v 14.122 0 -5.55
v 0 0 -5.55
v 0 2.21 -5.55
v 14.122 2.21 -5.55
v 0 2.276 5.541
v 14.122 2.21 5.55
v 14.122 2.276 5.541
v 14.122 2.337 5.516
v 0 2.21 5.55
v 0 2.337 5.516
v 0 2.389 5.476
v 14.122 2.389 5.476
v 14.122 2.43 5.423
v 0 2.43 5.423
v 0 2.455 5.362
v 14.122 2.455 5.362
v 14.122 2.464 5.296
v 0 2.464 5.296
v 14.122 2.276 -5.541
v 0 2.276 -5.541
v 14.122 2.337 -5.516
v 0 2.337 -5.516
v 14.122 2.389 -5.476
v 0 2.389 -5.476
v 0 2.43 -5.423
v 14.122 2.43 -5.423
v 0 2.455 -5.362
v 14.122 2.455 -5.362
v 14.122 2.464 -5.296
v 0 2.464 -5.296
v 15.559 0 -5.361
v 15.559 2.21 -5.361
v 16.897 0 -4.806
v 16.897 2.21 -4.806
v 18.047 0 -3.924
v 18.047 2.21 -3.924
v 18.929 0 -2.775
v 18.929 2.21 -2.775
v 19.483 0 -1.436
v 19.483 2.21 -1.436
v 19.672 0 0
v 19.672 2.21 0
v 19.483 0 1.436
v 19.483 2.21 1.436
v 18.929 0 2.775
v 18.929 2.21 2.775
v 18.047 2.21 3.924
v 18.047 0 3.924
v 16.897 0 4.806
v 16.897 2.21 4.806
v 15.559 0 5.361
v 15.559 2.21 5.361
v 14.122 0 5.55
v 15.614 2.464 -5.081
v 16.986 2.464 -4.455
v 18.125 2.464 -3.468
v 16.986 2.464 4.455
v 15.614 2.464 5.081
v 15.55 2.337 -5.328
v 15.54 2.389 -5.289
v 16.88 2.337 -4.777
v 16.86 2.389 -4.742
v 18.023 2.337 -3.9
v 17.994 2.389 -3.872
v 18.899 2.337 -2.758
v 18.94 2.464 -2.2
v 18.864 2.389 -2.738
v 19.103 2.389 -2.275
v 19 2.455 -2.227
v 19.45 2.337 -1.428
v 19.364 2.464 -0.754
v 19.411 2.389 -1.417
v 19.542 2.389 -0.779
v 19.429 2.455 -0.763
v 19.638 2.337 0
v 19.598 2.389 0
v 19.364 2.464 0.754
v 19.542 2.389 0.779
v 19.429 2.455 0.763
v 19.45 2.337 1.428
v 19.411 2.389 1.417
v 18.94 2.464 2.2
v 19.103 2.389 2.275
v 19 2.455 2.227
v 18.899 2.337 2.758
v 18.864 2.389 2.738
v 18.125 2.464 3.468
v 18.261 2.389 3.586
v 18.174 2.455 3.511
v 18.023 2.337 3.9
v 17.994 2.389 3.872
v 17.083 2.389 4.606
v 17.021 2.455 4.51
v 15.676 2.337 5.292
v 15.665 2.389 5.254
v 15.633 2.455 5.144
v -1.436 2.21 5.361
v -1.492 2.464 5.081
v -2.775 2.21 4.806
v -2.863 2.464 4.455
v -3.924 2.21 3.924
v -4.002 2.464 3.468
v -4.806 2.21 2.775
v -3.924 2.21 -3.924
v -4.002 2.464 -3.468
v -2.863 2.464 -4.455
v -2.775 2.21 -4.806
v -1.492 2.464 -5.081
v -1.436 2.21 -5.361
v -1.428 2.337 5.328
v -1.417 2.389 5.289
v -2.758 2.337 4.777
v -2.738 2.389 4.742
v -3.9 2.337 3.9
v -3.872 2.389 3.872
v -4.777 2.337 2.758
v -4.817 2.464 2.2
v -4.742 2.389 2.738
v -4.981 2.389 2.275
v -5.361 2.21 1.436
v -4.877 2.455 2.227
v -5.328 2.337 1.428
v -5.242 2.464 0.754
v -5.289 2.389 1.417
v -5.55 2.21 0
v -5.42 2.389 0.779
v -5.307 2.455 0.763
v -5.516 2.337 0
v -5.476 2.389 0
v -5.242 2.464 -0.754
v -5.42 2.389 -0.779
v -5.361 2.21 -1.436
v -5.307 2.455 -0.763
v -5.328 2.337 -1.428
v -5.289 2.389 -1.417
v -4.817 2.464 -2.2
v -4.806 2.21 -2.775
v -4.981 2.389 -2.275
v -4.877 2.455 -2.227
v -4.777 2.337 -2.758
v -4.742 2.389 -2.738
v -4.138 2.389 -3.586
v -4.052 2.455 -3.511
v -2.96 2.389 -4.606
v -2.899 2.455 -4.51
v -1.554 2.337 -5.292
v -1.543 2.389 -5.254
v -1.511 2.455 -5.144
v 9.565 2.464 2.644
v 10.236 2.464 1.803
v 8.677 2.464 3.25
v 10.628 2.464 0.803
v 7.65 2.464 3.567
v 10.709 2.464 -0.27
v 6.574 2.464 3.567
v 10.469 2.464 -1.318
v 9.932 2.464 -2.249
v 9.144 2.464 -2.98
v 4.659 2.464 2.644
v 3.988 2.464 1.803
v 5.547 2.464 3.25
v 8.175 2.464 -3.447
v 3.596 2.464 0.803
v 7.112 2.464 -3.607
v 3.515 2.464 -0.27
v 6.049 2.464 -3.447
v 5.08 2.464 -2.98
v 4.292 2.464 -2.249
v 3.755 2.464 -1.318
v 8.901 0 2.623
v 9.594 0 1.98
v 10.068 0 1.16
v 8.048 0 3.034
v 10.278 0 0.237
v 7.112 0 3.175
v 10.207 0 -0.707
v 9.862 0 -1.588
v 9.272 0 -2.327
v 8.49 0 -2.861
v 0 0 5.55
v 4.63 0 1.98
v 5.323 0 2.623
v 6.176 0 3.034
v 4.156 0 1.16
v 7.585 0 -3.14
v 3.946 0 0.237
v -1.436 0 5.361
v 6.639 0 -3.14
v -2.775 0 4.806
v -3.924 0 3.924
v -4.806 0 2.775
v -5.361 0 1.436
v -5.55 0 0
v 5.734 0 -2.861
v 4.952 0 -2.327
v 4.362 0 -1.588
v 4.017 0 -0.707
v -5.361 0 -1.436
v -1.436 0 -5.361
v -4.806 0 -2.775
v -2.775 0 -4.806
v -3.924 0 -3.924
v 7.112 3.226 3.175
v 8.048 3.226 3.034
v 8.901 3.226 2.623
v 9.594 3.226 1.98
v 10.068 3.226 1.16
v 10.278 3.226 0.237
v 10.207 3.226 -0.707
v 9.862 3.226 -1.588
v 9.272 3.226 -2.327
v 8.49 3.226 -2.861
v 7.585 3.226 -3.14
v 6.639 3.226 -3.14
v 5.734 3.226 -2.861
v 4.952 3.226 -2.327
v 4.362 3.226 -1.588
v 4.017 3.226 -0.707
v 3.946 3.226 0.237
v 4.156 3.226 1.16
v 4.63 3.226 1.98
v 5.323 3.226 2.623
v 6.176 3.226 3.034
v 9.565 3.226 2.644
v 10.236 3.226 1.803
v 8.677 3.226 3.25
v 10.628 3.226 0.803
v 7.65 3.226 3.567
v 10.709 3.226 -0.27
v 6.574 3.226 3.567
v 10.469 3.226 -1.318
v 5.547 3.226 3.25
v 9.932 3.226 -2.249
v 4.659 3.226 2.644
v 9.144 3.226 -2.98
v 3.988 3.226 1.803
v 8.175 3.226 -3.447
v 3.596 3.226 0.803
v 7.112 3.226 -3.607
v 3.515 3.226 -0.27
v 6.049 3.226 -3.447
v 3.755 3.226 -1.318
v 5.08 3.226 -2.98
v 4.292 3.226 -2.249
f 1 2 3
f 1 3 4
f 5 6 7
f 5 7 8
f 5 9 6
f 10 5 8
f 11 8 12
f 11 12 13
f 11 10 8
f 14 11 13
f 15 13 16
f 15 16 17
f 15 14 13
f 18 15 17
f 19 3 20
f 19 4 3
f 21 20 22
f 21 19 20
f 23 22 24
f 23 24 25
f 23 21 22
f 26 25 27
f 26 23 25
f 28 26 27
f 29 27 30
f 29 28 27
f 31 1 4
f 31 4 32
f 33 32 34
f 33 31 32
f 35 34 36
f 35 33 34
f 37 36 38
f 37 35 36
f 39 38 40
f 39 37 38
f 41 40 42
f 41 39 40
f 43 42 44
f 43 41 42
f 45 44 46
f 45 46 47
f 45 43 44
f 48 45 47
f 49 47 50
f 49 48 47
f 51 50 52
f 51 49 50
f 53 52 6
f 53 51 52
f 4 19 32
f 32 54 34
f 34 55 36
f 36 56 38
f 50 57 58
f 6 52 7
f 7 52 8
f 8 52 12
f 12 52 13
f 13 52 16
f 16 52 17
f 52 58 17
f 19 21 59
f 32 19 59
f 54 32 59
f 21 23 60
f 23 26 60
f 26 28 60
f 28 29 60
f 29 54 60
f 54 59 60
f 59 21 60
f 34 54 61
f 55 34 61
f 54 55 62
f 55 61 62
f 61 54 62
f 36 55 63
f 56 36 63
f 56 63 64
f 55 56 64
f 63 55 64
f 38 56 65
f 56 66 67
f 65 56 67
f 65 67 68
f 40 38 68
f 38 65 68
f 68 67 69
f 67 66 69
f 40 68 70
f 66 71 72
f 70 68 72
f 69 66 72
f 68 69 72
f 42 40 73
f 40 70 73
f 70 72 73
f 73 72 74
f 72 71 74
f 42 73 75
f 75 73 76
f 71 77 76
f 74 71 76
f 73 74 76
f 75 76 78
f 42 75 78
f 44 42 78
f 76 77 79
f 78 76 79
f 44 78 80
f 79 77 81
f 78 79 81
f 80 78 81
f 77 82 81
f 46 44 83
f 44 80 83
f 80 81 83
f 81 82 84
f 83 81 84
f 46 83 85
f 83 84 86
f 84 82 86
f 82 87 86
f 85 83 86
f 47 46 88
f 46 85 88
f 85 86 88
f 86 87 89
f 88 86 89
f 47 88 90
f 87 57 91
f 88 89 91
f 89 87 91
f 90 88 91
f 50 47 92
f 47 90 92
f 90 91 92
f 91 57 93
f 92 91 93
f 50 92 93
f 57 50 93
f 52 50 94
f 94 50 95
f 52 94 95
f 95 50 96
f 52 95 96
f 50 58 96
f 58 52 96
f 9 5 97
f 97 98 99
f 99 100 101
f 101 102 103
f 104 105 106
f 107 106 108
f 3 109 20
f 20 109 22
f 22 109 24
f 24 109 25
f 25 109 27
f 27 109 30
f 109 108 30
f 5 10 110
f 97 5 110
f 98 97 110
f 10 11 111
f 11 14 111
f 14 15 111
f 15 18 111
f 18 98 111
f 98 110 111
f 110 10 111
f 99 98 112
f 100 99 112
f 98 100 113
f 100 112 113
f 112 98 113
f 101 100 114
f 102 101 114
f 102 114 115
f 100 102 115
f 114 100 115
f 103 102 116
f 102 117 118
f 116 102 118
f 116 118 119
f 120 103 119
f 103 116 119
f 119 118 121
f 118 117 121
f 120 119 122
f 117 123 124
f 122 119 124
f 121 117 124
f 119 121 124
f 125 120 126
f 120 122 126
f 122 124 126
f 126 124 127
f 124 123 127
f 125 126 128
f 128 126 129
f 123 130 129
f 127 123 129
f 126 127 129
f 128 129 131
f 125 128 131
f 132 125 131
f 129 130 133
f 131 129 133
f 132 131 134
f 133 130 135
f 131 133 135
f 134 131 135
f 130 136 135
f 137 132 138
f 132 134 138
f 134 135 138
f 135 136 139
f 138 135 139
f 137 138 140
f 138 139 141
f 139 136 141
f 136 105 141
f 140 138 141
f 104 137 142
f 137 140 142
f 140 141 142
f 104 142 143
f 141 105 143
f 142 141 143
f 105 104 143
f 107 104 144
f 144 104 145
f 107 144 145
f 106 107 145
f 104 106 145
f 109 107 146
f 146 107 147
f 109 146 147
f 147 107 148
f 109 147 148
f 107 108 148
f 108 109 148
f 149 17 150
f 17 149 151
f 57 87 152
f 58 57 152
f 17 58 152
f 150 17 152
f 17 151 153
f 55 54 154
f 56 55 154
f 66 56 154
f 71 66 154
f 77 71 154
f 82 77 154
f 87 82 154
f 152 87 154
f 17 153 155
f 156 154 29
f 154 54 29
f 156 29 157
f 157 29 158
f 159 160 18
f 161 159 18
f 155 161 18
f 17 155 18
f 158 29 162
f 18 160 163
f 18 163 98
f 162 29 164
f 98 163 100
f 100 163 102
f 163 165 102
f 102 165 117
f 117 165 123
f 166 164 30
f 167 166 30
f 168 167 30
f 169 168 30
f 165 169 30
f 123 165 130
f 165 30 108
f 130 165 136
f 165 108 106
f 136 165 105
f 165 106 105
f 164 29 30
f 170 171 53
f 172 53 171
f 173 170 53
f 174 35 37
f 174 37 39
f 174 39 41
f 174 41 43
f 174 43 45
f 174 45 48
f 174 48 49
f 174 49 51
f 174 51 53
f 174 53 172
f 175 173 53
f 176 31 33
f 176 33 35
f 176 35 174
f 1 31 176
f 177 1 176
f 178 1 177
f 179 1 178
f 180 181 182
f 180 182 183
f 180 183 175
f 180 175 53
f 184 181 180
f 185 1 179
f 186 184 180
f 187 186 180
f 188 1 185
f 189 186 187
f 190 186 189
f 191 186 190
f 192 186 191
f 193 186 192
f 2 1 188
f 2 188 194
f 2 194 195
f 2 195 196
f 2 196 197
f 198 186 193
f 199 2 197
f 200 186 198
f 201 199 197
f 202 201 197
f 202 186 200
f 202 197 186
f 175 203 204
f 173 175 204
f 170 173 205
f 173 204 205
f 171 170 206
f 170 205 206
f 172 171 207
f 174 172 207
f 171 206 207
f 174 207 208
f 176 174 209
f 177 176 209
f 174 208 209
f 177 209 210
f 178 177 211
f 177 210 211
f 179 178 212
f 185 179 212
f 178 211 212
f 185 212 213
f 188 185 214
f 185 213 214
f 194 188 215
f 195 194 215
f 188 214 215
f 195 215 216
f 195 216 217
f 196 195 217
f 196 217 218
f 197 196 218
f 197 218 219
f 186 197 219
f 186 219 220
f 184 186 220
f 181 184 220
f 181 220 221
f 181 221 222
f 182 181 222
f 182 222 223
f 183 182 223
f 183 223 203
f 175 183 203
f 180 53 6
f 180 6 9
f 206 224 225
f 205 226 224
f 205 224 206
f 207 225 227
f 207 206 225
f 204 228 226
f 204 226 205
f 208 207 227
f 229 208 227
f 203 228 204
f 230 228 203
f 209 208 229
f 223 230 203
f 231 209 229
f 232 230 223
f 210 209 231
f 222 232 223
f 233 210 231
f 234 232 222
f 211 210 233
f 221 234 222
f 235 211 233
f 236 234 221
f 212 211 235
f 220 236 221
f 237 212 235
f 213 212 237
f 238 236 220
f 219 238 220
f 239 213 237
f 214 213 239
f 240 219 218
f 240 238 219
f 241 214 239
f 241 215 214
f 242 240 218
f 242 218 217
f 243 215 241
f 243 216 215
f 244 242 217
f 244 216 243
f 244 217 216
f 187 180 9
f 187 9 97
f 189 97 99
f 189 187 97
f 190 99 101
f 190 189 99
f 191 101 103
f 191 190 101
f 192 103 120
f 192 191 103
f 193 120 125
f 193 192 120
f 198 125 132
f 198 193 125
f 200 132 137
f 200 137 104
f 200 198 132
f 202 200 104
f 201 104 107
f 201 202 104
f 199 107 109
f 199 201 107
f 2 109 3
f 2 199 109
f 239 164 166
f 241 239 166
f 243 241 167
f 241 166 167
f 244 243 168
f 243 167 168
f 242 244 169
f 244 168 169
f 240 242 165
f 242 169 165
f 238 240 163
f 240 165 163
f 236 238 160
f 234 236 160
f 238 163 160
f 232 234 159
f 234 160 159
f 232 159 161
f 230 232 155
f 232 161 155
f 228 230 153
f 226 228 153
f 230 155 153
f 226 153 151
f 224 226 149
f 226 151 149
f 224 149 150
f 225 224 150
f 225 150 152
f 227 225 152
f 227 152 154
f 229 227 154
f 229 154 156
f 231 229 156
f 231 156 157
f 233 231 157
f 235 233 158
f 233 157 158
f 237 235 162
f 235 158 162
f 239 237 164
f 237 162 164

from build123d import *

# Parameters (mm, degrees)
BOSS_EXTRUDE1_DEPTH = 2.4638
SKETCH2_R           = 3.6068
BOSS_EXTRUDE3_DEPTH = 0.762
SKETCH5_R           = 3.175
CUT_EXTRUDE2_DEPTH  = 21.693152562
FILLET1_R           = 0.254


with BuildPart() as part:
    # Sketch1 → Boss-Extrude1 (new body)
    with BuildSketch(Plane(origin=(0, 0, 0), x_dir=(1, 0, 0), z_dir=(0, 1, 0))):
        with BuildLine():
            Line((0, 5.5499), (14.1224, 5.5499))
            ThreePointArc((14.1224, 5.5499), (19.6723, 0), (14.1224, -5.5499))
            Line((14.1224, -5.5499), (0, -5.5499))
            ThreePointArc((0, -5.5499), (-5.5499, 0), (0, 5.5499))
        make_face()
    extrude(amount=BOSS_EXTRUDE1_DEPTH)

    # Sketch2 → Boss-Extrude3 (add)
    with BuildSketch(Plane(origin=(0, 2.4638, 0), x_dir=(1, 0, 0), z_dir=(0, 1, 0))):
        with Locations(Location((7.112, 0, 0), (0, 0, 90))):
            Circle(SKETCH2_R)
    extrude(amount=BOSS_EXTRUDE3_DEPTH)

    # Sketch5 → Cut-Extrude2 (cut, through all)
    with BuildSketch(Plane(origin=(0, 3.2258, 0), x_dir=(1, 0, 0), z_dir=(0, 1, 0))):
        with Locations(Location((7.112, 0, 0), (0, 0, 270))):
            Circle(SKETCH5_R)
    extrude(amount=-CUT_EXTRUDE2_DEPTH, mode=Mode.SUBTRACT)

    # Fillet1
    fillet1_edges = [part.edges().sort_by_distance(p)[0] for p in [
        (19.6723, 2.4638, 0),
        (7.0612, 2.4638, -5.5499),
        (-5.5499, 2.4638, 0),
        (7.0612, 2.4638, 5.5499),
    ]]
    fillet(fillet1_edges, radius=FILLET1_R)


solid = part.part
